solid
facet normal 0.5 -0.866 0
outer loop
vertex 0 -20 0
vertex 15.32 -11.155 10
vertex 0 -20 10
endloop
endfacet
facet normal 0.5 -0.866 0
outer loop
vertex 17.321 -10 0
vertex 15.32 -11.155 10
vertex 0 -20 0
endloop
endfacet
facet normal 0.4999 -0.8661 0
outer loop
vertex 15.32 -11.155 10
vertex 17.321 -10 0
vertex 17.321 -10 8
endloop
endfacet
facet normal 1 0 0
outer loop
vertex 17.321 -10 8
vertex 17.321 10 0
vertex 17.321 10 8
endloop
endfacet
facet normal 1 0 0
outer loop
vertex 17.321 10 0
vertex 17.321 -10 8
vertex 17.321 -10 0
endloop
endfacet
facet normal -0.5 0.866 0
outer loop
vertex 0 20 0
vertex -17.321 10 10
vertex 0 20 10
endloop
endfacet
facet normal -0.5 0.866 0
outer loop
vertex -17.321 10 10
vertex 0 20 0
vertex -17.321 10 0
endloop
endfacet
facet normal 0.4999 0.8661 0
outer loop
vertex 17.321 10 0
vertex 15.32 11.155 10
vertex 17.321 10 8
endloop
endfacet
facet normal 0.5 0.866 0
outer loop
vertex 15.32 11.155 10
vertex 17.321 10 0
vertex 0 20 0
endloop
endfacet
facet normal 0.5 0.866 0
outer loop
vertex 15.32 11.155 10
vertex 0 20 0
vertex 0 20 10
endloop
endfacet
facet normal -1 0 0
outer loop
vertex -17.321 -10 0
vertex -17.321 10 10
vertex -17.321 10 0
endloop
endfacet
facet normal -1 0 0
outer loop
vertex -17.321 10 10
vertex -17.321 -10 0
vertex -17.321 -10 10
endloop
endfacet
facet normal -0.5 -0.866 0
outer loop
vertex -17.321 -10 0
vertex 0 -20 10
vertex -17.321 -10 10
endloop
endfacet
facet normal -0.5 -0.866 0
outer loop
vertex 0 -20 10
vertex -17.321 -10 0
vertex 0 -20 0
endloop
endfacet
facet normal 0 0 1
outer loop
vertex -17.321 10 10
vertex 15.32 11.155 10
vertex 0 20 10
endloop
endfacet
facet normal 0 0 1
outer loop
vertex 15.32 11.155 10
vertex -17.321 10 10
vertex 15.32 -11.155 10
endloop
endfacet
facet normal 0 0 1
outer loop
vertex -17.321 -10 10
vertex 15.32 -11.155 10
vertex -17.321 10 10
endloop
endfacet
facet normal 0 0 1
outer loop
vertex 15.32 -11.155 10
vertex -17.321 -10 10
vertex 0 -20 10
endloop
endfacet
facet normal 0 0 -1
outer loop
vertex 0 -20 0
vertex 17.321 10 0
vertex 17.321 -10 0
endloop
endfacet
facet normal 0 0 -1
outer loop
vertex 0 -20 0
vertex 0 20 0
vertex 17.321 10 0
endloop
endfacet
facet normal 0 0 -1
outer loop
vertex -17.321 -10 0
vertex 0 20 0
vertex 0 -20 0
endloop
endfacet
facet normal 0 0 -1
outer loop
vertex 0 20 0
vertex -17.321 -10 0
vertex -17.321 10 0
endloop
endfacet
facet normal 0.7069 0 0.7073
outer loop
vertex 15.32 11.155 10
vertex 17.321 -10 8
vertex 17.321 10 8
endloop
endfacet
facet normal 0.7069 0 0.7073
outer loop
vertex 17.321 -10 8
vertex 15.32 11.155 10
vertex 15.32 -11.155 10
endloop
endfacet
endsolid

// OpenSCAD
// Hexagonal prism with chamfer on a non-orthogonal wall (T-006)
$fn = 6;
radius = 20;
height = 10;
chamfer_width = 2;
wall_angle = 0;

module hex_chamfer(radius=20, height=10, chamfer_width=2, wall_angle=0) {
    a = radius * cos(180 / 6);
    difference() {
        rotate([0, 0, 30]) cylinder(r=radius, h=height, $fn=6);
        rotate([0, 0, wall_angle]) rotate([90, 0, 0]) translate([0, 0, -30])
            linear_extrude(height=60)
                polygon([[a - chamfer_width, height],
                         [a + 1, height],
                         [a + 1, height - chamfer_width - 1]]);
    }
}

hex_chamfer(radius, height, chamfer_width, wall_angle);
